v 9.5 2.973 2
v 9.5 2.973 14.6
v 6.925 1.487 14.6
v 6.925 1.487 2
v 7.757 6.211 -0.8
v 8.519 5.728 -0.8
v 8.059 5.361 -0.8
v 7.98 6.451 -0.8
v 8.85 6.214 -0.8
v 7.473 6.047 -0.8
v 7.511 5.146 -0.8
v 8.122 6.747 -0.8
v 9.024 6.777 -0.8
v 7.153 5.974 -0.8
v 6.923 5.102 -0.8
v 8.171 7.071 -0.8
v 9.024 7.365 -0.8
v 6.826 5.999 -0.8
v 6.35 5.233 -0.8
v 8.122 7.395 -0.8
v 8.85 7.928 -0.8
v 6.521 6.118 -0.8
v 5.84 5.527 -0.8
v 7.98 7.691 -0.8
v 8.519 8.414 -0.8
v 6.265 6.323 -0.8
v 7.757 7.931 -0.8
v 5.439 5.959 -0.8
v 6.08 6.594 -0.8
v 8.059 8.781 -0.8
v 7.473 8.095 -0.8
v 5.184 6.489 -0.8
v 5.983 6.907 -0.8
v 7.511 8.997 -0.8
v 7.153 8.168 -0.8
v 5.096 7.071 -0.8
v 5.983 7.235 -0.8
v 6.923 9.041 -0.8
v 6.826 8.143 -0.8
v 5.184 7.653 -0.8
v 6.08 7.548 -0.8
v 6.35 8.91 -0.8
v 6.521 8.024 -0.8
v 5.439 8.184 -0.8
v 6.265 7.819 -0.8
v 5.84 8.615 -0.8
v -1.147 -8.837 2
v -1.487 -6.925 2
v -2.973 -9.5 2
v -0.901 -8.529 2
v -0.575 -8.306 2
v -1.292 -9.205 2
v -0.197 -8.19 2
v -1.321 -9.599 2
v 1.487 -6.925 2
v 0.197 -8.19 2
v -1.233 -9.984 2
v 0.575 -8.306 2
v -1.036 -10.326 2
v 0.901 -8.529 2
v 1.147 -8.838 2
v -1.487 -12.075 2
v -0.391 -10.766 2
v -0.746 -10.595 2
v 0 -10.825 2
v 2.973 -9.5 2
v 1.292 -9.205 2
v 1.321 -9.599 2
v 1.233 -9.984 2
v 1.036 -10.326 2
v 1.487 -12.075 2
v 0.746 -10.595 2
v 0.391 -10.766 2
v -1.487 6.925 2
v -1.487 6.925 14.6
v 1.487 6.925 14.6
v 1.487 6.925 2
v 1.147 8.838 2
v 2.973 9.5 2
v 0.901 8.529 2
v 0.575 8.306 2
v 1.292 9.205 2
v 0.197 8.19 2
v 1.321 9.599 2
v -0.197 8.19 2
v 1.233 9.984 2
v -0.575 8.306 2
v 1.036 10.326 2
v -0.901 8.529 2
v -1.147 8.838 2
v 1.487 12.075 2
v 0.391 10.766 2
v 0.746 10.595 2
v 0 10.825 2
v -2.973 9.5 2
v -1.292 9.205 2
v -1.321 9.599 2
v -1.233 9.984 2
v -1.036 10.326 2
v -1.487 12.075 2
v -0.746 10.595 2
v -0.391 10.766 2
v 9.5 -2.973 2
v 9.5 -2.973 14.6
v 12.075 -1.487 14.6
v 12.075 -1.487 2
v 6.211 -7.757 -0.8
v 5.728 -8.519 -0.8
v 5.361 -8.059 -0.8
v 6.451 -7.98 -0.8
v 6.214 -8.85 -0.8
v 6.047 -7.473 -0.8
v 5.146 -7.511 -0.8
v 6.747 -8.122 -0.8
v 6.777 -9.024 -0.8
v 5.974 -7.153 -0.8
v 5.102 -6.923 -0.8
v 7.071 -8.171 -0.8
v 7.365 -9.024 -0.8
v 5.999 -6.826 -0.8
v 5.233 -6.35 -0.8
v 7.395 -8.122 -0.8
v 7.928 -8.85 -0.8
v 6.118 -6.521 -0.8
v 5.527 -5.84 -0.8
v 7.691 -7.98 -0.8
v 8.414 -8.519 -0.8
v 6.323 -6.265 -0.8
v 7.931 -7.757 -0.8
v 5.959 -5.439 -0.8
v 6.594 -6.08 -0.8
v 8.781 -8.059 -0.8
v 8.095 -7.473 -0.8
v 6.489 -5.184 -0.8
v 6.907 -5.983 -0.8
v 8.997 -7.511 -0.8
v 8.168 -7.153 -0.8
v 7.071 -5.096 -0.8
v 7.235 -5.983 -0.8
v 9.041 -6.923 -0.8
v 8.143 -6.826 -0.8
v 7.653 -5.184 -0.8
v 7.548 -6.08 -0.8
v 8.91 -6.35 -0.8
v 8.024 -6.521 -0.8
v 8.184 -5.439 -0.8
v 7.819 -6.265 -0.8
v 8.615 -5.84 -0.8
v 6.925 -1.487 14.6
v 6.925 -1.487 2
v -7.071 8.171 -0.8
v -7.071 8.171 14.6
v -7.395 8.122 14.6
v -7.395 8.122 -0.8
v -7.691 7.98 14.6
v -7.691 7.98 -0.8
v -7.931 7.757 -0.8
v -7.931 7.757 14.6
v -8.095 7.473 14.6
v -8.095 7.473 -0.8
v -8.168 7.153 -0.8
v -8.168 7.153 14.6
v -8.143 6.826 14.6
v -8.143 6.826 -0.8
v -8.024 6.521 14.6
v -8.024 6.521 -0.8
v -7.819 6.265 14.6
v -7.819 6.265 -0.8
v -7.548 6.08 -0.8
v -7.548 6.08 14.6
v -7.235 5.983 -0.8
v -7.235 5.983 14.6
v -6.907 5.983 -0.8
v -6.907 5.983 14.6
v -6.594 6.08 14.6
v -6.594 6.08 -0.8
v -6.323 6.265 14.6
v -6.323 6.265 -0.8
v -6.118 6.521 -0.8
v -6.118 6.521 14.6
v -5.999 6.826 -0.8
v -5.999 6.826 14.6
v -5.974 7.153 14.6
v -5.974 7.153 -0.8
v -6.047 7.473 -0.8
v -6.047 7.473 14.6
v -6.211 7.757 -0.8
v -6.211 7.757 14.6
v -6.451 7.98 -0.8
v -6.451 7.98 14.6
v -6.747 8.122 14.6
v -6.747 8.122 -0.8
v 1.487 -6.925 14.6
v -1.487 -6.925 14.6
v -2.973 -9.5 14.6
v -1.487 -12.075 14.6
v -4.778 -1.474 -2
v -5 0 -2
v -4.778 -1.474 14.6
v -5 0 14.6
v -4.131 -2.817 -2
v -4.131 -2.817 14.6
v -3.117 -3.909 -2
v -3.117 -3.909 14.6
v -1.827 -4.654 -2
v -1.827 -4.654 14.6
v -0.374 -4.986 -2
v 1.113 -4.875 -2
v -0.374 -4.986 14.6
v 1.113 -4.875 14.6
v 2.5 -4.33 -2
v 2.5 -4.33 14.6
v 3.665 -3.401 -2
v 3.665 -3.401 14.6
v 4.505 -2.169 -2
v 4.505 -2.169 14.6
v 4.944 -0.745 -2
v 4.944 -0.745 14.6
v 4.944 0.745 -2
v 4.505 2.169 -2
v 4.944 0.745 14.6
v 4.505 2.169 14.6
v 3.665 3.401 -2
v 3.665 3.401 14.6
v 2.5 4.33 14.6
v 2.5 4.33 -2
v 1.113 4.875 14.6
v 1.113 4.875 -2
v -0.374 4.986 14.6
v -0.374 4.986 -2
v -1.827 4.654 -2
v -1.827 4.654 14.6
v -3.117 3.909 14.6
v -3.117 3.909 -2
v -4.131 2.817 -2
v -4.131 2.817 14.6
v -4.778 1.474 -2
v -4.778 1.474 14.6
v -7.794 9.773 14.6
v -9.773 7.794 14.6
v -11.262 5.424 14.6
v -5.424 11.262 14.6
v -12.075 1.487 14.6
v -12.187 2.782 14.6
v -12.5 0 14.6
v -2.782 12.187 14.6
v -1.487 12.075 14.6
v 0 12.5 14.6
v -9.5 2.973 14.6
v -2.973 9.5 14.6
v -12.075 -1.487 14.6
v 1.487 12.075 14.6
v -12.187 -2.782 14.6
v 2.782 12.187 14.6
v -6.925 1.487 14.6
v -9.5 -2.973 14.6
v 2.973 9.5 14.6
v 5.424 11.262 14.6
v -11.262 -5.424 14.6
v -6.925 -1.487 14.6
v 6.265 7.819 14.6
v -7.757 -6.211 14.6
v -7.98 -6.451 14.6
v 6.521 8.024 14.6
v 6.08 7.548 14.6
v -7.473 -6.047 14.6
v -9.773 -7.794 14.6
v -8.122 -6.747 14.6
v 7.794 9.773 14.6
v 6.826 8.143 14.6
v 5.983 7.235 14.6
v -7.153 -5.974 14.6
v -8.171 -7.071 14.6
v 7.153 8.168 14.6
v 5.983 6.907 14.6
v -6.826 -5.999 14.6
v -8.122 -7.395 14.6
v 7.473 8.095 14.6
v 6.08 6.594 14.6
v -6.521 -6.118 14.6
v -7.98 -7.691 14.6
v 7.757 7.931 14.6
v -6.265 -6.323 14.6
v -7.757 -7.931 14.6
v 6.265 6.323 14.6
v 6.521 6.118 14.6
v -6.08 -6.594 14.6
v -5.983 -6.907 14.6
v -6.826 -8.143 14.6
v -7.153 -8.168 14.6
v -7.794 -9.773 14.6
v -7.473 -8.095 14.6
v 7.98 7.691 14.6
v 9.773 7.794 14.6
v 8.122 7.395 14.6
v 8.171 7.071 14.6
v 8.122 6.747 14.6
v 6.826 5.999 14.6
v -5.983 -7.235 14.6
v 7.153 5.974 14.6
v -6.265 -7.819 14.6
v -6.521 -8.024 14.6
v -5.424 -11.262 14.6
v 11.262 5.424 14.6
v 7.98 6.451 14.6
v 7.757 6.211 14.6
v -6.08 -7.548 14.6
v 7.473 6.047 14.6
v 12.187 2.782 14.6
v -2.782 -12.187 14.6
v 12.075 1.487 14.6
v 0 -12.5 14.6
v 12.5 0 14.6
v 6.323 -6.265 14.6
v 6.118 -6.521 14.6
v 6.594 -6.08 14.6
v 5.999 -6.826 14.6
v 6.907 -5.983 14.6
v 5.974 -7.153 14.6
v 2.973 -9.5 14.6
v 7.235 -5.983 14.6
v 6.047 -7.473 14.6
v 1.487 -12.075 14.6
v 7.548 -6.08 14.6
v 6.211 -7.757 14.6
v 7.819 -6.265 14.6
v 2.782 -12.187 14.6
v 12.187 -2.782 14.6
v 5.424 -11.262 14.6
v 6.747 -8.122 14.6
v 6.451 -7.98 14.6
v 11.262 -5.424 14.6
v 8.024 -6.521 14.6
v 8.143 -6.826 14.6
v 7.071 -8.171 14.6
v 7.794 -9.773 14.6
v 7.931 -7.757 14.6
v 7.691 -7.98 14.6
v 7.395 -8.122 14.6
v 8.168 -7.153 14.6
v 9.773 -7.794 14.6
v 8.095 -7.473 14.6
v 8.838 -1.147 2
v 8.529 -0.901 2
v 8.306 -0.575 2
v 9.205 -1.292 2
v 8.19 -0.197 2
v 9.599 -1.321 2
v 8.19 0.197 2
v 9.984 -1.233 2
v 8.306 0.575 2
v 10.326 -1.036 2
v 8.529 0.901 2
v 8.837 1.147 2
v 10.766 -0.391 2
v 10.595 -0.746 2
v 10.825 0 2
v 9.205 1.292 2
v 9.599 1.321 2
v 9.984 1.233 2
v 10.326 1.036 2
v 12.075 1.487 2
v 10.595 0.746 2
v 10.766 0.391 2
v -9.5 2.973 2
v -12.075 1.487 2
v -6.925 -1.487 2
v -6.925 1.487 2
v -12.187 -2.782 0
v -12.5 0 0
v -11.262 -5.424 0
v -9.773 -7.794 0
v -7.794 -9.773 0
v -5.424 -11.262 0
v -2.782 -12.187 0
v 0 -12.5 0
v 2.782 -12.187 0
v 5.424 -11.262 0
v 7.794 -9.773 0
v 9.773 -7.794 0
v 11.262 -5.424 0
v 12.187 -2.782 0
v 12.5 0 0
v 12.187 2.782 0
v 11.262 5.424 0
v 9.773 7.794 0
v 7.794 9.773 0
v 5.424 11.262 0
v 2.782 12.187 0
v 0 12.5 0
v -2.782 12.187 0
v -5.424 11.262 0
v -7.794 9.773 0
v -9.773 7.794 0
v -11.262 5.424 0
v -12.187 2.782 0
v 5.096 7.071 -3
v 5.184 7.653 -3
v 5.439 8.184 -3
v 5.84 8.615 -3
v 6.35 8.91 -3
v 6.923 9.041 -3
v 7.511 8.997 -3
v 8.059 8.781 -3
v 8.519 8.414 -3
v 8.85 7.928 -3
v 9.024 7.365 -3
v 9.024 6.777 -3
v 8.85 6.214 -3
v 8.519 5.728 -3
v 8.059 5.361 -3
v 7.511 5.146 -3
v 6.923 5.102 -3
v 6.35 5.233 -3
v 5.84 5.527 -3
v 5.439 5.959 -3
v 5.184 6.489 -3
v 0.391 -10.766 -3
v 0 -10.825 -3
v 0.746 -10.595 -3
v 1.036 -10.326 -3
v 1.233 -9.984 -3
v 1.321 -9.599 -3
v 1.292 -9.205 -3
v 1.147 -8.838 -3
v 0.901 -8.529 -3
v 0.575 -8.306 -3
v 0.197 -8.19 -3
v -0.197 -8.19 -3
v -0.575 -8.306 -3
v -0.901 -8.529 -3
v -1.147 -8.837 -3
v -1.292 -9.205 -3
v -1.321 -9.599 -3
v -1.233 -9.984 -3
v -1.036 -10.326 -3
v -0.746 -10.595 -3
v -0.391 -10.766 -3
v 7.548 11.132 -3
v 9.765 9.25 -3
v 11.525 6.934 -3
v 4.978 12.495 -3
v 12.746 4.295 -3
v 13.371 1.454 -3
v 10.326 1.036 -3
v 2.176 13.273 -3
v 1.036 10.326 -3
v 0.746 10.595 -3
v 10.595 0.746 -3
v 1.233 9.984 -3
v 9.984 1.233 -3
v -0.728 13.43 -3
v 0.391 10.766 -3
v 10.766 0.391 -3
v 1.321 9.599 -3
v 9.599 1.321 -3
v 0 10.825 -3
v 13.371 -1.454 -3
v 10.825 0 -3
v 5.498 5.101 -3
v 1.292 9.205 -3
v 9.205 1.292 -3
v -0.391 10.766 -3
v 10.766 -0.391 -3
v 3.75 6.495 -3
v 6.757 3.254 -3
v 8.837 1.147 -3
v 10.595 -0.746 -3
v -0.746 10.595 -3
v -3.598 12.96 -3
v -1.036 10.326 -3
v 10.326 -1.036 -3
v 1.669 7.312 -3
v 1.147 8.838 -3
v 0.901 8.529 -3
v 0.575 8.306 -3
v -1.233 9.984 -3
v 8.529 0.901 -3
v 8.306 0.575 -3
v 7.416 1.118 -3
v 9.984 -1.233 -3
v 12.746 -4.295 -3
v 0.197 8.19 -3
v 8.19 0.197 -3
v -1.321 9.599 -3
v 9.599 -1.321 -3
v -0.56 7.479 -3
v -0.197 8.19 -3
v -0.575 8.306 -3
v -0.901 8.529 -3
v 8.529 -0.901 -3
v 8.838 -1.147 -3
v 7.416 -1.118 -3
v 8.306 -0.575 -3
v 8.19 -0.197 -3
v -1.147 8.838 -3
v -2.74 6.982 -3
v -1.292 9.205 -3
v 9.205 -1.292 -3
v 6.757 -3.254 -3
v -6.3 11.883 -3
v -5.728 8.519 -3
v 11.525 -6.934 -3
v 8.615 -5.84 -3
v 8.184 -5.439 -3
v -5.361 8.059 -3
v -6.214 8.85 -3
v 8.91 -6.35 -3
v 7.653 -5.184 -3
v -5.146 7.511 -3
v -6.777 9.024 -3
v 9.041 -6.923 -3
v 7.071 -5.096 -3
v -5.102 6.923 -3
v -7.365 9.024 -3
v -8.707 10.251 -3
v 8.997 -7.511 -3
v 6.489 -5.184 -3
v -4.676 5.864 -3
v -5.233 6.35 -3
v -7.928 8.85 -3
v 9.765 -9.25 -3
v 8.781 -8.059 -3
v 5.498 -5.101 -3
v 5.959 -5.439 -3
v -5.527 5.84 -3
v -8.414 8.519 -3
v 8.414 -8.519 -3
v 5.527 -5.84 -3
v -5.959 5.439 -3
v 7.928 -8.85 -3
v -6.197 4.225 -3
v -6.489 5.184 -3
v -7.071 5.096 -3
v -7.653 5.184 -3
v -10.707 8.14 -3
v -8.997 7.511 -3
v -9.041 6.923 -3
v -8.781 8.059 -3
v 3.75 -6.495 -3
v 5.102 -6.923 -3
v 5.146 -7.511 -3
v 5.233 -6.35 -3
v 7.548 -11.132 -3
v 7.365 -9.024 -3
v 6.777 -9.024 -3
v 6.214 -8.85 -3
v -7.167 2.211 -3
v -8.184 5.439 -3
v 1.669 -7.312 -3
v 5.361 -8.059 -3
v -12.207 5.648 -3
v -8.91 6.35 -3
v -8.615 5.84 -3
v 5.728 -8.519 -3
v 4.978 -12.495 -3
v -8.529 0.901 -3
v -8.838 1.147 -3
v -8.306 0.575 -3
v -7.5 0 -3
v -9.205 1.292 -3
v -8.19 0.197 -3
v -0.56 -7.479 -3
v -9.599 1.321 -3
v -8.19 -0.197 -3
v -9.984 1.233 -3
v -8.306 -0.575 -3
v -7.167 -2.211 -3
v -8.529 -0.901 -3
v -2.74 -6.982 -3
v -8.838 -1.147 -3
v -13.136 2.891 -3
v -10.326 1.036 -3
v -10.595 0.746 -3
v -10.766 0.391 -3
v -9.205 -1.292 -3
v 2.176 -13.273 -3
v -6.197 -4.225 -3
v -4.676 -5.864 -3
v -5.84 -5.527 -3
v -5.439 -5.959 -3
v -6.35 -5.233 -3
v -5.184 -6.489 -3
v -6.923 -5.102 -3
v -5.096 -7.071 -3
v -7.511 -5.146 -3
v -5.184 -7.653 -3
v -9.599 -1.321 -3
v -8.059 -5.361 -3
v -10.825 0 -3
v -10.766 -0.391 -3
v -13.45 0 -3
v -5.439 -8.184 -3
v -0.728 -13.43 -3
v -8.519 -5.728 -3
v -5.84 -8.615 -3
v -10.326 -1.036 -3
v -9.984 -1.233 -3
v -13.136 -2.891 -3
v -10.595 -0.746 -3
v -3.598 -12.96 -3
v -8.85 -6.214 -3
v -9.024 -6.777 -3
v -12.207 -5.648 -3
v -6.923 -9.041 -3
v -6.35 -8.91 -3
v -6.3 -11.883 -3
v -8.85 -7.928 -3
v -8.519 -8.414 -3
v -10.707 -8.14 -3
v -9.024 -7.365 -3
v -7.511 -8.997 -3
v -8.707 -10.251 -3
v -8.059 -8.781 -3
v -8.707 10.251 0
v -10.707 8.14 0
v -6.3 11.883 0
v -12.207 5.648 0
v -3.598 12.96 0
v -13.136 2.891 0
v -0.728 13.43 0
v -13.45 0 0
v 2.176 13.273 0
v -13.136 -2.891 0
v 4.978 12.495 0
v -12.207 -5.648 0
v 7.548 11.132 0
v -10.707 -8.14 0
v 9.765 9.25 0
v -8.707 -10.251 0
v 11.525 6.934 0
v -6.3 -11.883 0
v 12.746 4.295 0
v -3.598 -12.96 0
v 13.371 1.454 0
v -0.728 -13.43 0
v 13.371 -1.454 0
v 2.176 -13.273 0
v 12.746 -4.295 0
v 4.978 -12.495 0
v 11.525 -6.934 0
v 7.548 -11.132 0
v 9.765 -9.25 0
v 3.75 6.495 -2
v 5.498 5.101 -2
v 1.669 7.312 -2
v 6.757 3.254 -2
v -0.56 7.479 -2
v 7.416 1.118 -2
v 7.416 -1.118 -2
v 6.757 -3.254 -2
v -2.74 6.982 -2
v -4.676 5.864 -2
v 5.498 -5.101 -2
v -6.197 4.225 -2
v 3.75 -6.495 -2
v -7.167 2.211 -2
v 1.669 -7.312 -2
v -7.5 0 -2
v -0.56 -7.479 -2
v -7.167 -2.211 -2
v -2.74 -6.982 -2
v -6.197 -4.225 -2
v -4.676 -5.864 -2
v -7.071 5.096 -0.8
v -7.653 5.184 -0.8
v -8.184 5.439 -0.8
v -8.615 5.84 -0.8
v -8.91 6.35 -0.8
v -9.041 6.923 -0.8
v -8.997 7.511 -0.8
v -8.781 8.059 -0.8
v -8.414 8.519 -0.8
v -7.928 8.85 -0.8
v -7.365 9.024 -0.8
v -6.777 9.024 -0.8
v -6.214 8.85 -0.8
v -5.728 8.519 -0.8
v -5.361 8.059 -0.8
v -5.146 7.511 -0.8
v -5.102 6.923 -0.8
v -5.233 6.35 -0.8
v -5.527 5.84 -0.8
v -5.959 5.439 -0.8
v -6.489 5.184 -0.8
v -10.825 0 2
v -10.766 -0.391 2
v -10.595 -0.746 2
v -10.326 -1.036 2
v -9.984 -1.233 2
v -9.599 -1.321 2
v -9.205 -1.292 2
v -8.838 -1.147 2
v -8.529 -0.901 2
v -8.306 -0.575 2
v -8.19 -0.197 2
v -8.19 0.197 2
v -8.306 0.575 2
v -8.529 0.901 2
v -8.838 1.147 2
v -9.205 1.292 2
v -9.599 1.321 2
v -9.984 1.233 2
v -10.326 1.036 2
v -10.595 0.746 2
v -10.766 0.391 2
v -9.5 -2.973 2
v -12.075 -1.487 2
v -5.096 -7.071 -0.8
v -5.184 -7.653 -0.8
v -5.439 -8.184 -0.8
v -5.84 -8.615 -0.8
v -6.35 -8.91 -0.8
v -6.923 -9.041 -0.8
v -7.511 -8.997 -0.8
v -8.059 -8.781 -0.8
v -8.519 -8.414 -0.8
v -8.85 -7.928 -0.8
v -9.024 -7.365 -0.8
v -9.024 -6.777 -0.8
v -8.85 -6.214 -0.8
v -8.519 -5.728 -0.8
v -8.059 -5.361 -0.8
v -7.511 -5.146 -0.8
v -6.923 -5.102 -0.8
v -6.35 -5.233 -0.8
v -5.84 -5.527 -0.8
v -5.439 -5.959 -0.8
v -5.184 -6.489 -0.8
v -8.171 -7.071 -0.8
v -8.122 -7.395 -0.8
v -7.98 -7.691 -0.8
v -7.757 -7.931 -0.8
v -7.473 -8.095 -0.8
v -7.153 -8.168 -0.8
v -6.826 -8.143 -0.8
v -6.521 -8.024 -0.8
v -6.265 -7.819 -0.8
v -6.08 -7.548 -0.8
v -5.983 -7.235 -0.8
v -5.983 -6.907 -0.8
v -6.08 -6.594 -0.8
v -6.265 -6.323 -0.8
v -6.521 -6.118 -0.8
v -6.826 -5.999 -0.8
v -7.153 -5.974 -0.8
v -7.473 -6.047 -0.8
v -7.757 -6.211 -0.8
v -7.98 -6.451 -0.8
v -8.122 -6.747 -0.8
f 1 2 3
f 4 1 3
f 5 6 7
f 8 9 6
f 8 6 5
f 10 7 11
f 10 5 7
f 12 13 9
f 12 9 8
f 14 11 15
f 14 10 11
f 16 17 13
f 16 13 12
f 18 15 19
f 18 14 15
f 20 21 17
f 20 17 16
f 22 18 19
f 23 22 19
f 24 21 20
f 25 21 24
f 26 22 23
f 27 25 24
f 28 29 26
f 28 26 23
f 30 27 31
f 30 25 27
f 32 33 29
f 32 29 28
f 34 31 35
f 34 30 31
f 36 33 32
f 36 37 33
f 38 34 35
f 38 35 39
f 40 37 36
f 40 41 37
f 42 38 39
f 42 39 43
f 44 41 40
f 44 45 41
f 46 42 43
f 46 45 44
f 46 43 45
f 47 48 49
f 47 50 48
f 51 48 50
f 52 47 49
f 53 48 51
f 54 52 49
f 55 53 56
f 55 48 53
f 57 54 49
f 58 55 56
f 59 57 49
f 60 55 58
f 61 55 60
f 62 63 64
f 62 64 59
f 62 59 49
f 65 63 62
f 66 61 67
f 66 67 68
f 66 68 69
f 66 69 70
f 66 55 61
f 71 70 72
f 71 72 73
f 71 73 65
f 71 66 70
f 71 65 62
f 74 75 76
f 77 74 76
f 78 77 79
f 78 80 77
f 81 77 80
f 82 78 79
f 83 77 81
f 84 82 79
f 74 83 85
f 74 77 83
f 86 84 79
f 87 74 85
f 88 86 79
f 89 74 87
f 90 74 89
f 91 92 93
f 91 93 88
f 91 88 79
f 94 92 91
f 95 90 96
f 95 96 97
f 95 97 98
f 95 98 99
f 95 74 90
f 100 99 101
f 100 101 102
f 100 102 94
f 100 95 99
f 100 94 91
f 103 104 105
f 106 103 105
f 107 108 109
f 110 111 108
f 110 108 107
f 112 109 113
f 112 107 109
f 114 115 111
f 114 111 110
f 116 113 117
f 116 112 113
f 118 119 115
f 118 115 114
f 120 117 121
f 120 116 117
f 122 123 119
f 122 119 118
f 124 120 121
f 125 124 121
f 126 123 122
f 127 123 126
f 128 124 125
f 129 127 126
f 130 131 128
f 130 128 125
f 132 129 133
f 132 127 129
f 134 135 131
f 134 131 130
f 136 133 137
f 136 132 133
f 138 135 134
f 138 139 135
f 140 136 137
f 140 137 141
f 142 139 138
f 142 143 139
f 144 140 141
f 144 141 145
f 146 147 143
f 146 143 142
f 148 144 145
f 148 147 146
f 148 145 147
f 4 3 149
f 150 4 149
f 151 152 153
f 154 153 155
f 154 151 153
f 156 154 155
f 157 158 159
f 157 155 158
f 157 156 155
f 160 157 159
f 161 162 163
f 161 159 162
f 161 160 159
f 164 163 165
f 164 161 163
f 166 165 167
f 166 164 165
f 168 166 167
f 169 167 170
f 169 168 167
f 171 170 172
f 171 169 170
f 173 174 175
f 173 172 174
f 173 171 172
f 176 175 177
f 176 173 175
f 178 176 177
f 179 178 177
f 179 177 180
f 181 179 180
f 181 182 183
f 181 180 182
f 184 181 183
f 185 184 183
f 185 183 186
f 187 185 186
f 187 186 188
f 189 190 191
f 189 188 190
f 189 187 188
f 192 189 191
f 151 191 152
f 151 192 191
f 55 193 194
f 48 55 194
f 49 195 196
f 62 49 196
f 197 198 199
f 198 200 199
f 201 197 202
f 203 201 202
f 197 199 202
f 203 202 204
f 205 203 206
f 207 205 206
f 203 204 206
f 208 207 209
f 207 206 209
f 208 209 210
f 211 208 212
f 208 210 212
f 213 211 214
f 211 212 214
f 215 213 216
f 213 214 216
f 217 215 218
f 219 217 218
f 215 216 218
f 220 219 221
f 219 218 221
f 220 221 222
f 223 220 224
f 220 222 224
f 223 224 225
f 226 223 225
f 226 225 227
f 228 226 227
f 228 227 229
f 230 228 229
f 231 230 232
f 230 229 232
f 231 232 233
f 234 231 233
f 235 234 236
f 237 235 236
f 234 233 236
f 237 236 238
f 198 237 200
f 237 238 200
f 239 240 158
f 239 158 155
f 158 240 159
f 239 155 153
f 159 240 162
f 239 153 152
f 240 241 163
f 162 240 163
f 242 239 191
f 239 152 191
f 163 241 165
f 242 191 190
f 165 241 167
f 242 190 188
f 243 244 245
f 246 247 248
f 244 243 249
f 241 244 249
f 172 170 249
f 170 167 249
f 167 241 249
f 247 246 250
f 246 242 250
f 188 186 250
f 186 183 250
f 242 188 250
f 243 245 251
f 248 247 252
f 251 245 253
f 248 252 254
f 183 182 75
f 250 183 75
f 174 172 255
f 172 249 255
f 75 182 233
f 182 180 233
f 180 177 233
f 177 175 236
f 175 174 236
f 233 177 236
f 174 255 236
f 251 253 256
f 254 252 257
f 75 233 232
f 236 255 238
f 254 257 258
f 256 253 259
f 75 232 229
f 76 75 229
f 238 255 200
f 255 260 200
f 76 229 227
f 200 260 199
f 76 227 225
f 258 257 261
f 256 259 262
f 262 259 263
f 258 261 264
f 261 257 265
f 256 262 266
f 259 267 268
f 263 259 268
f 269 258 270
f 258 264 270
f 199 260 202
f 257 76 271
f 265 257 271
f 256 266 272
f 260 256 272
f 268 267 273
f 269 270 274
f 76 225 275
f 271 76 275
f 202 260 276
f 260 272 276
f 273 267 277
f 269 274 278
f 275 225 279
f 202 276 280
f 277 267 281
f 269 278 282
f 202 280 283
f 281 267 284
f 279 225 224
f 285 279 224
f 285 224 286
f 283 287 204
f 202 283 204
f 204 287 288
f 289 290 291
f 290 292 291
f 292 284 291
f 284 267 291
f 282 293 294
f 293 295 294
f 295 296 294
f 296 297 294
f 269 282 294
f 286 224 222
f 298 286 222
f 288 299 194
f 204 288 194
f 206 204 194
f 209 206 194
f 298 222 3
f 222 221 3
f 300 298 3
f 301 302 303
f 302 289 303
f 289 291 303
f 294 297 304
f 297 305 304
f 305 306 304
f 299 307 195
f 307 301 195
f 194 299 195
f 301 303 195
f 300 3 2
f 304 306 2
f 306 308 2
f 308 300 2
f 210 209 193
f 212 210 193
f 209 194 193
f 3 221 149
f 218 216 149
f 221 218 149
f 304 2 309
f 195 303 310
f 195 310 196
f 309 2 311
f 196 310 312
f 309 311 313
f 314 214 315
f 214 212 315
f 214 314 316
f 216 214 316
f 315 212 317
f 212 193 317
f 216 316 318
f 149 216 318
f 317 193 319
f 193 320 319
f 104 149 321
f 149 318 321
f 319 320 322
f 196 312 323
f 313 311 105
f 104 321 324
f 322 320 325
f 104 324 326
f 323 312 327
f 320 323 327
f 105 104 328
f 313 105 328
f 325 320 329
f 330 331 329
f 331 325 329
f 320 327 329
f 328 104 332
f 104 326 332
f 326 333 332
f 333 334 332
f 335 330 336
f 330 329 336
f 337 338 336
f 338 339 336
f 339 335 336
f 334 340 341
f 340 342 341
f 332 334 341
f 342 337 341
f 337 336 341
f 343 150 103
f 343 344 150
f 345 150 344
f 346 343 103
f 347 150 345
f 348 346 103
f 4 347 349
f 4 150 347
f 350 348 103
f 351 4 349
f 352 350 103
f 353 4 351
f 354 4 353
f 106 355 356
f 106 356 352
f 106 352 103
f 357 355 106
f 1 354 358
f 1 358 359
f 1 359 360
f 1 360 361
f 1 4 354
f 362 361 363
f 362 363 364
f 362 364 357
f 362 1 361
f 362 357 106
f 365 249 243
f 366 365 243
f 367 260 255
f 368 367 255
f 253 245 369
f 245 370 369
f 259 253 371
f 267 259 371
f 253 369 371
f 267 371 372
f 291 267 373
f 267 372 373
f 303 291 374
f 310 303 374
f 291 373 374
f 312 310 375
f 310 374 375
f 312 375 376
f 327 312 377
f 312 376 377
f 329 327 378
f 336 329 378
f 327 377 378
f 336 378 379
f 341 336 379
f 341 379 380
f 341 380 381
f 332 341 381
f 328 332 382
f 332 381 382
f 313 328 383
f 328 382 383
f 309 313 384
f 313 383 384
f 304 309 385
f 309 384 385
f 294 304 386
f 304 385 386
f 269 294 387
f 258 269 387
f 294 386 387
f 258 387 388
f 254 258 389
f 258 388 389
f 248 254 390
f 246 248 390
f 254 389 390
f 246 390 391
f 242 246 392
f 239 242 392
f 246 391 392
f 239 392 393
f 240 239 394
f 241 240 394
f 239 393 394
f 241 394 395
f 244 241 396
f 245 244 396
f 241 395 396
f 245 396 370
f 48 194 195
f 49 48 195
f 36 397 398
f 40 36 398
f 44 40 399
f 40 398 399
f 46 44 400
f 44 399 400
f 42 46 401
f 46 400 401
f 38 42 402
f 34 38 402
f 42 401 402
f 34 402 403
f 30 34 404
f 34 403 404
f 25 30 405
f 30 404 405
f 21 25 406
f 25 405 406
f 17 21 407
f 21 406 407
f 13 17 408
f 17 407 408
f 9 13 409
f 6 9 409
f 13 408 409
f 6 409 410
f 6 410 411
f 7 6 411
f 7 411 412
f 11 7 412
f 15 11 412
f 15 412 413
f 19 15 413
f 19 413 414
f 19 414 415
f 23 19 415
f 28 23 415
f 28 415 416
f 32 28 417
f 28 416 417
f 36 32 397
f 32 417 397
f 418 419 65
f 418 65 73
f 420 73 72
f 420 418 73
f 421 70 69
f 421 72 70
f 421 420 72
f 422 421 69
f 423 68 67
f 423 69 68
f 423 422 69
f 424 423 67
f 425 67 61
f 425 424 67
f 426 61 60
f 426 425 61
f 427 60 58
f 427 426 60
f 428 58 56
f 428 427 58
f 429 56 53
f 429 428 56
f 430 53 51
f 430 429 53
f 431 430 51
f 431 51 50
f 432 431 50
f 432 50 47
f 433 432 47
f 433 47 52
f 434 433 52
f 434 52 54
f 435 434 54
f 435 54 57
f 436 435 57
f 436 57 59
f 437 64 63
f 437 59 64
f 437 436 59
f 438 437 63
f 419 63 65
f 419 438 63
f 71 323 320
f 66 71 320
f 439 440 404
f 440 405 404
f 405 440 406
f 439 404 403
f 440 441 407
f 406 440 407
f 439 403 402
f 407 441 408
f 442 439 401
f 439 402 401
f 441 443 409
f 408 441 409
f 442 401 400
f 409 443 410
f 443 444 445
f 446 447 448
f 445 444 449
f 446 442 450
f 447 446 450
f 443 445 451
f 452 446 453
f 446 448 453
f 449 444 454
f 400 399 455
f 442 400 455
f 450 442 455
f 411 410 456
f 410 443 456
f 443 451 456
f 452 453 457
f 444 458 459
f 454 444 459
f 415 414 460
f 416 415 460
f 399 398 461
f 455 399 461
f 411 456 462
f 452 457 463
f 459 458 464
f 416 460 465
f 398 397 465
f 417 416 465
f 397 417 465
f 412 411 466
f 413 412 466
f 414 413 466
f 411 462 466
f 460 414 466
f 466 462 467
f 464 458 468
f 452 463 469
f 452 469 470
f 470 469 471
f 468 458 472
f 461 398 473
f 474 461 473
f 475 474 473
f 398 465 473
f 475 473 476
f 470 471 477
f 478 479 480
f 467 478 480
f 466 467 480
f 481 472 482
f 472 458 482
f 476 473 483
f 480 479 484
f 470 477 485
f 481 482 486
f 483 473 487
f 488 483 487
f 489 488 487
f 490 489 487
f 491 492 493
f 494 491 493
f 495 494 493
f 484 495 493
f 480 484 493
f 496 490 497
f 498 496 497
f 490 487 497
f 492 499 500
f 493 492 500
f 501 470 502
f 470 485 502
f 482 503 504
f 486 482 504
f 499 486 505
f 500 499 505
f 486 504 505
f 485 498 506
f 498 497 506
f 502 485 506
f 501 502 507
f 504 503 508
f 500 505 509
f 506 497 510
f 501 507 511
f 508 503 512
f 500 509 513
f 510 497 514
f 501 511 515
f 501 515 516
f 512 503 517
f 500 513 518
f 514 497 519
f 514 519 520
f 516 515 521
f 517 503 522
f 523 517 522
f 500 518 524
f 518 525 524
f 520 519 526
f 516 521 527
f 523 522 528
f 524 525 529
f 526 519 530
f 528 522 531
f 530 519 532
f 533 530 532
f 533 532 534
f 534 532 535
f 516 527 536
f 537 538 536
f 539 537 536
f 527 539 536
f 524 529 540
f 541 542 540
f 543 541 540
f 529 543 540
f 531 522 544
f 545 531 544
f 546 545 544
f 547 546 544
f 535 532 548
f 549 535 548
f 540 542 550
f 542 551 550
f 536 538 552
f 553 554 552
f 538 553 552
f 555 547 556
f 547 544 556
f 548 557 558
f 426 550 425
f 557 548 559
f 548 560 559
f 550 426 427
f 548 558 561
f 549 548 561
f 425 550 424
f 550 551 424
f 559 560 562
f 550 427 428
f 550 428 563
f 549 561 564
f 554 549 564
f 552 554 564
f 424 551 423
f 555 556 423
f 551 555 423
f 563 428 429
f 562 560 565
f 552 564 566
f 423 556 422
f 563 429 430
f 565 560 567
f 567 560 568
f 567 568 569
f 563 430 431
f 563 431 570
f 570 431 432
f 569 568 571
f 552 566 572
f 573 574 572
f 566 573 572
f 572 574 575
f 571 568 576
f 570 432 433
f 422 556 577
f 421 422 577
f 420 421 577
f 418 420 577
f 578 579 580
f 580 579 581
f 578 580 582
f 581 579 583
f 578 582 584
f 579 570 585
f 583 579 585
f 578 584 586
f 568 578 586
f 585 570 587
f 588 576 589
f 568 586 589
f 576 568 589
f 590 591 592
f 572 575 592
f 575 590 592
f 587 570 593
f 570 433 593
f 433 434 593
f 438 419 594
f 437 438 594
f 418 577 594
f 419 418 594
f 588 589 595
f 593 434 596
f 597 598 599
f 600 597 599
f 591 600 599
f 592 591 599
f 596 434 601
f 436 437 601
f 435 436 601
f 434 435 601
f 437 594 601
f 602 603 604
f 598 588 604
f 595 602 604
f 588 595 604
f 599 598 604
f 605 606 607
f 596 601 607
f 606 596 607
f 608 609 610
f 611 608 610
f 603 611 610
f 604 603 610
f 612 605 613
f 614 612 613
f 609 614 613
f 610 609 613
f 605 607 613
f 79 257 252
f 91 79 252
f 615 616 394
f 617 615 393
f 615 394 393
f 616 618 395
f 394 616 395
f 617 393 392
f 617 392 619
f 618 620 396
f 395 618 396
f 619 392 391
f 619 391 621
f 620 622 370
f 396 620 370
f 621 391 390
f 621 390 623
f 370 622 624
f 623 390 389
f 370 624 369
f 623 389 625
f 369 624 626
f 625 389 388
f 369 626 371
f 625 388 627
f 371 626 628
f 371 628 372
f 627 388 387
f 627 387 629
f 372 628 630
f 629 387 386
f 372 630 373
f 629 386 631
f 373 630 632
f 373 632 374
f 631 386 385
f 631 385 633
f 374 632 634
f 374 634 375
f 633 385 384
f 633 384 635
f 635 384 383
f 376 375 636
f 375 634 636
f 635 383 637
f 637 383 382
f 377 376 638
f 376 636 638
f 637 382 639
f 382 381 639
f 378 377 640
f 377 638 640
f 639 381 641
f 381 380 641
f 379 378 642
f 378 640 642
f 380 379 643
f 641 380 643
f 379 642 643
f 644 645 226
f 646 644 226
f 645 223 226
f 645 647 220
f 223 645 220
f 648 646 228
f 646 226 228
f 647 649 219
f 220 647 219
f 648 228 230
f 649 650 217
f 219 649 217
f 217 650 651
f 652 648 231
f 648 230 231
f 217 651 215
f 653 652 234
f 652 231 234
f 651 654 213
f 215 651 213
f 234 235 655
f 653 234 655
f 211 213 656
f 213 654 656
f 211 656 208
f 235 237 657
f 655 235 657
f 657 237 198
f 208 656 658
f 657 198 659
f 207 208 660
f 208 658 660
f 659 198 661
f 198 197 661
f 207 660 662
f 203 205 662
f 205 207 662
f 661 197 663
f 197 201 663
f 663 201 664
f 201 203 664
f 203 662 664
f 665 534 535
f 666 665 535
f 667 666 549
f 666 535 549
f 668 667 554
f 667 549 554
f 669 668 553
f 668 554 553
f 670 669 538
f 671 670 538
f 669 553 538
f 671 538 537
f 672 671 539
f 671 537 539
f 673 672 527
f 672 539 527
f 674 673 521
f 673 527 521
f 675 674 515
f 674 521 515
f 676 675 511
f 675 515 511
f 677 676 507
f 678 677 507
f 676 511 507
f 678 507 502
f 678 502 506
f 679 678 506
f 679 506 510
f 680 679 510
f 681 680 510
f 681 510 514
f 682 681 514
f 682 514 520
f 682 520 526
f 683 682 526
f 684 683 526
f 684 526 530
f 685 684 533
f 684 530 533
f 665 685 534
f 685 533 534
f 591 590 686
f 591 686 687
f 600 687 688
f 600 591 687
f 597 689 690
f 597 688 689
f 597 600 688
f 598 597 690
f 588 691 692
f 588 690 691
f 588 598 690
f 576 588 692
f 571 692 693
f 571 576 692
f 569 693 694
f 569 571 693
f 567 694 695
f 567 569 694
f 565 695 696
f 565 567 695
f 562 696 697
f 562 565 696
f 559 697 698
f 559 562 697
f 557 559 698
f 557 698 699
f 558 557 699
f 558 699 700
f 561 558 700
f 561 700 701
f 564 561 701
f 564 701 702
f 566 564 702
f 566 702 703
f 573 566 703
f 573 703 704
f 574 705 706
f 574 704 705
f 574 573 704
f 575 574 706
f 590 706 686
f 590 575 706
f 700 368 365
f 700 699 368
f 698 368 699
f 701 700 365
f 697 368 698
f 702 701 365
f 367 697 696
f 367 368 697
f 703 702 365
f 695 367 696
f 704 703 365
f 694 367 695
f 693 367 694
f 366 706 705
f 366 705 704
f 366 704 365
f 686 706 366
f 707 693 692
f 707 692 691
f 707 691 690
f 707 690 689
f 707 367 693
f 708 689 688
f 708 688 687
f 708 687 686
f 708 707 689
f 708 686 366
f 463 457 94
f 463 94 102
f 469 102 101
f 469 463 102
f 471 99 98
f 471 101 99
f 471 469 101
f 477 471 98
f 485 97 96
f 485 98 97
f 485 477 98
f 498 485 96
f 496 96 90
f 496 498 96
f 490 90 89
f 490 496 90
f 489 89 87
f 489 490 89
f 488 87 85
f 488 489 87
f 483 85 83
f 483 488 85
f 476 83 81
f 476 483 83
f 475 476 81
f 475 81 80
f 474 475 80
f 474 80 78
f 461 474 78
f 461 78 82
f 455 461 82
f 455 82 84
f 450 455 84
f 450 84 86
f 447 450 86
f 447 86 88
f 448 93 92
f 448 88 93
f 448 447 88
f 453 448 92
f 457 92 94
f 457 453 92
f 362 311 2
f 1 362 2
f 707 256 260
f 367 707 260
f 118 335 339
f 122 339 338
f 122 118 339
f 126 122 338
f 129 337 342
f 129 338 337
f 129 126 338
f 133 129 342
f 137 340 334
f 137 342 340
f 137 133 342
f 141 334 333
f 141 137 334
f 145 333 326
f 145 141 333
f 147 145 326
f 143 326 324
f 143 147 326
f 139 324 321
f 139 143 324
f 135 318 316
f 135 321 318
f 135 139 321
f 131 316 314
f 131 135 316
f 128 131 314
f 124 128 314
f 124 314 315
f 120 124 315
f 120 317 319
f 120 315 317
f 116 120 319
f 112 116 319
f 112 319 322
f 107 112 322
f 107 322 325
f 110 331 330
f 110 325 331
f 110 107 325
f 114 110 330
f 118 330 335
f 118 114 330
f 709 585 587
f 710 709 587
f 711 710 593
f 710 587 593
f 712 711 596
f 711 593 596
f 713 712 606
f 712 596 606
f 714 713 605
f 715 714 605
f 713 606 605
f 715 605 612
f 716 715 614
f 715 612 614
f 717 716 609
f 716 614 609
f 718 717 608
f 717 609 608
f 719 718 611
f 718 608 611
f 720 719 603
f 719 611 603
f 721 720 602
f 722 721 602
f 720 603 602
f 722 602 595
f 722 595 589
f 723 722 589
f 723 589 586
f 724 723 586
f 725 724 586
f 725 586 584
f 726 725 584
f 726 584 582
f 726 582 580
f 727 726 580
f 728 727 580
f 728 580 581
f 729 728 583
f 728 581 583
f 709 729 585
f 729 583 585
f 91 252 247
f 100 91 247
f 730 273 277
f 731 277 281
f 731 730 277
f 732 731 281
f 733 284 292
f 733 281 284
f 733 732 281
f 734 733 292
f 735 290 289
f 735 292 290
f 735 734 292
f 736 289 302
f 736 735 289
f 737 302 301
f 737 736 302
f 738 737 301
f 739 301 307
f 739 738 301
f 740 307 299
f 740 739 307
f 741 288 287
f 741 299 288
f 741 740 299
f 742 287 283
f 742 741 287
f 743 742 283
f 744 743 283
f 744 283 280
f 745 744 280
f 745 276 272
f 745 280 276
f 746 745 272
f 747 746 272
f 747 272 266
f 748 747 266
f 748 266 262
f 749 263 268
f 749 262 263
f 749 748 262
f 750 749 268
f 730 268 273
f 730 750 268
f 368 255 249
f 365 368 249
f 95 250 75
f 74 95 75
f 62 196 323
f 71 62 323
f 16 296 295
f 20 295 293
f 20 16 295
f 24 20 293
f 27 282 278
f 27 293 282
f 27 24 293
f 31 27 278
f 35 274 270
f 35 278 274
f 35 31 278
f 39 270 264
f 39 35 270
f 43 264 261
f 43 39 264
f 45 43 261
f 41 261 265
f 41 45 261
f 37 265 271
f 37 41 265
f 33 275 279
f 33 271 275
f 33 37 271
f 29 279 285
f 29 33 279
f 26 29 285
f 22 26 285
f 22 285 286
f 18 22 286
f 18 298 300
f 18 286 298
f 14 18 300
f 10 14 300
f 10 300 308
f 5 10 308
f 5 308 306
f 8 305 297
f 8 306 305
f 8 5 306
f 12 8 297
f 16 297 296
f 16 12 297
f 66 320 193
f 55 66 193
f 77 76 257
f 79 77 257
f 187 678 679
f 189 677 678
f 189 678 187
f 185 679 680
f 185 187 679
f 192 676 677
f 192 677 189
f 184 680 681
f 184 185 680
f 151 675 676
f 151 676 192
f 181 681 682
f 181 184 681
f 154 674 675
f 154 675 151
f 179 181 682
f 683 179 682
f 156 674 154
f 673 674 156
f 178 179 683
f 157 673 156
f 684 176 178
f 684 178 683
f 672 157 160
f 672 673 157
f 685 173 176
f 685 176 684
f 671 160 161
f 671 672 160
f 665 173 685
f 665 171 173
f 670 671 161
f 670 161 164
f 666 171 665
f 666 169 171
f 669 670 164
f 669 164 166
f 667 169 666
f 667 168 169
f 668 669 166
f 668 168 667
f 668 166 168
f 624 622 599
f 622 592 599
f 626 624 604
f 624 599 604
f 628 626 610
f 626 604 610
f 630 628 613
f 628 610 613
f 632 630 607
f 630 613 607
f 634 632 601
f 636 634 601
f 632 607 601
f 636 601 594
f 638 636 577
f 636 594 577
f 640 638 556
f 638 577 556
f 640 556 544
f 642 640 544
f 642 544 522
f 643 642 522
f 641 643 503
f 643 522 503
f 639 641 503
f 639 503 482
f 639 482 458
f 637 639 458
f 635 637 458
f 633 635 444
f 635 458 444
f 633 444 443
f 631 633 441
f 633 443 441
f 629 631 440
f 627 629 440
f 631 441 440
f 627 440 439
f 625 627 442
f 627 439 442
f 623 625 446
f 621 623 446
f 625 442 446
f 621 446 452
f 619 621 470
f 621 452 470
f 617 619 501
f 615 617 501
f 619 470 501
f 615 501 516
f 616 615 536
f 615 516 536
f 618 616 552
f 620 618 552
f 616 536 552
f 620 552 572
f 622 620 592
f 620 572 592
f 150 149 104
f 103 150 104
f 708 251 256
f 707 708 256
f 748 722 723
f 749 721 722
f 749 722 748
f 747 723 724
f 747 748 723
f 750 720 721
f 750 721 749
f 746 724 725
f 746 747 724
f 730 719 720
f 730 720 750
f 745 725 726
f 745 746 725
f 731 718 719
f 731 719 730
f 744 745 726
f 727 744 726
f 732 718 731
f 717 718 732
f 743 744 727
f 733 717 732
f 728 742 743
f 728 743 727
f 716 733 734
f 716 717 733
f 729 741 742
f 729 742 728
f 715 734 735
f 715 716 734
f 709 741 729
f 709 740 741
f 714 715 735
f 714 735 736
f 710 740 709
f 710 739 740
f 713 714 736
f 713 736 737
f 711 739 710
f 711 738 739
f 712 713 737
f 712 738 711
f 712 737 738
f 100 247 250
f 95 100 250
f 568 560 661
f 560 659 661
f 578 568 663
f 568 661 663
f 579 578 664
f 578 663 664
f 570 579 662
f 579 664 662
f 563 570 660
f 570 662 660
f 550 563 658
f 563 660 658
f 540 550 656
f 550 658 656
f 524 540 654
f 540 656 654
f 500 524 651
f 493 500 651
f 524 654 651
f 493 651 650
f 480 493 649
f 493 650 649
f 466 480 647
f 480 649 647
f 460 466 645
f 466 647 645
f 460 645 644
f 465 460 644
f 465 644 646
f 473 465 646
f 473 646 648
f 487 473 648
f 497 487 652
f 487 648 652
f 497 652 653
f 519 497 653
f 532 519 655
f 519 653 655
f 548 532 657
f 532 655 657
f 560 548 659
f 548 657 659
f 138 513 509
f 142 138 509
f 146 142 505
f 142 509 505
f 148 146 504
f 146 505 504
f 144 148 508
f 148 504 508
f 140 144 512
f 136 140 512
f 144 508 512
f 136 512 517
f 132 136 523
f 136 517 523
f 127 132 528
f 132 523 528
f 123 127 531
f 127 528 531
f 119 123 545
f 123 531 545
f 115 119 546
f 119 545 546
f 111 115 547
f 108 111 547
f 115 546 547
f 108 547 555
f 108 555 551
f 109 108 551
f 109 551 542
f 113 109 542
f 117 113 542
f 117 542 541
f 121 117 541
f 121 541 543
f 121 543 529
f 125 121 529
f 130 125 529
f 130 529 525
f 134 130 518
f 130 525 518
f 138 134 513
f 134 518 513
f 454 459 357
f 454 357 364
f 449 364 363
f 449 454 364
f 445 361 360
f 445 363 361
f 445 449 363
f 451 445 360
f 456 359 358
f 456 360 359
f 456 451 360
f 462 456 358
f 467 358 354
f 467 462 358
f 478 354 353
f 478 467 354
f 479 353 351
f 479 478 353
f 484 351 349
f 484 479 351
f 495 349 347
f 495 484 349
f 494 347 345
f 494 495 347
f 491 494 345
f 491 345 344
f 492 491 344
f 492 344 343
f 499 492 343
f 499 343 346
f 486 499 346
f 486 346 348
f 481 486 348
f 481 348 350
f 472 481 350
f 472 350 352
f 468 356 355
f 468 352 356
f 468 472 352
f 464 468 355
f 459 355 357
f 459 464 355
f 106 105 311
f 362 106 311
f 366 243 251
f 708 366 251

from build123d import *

# Parameters (mm, degrees)
ATTACHMENTBOLTHOLES_START = -4
SKETCH11_R                = 1.325
ATTACHMENTBOLTHOLES_DEPTH = 19.6
SKETCH13_R                = 1.975
SHAFTBOLTHEAD_DEPTH       = 2.2
SHAFTBOLTTHRU_START       = -4
SKETCH14_R                = 1.1
SHAFTBOLTTHRU_DEPTH       = 19.6
NUTHOLE_DEPTH             = 12.6
CIRPATTERN1_COUNT         = 4


with BuildPart() as part:
    # Sketch10 → Revolve1 (revolve)
    with BuildSketch(Plane(origin=(0, 0, 0), x_dir=(1, 0, 0), z_dir=(0, 1, 0))):
        Polygon((-13.45, 3), (-7.5, 3), (-7.5, 2), (-5, 2), (-5, -14.6), (-12.5, -14.6), (-12.5, 0), (-13.45, 0), align=None)
    revolve(axis=Axis((0, 0, -38.468953364), (0, 0, 1)))

    # Sketch11 → AttachmentBoltHoles (cut)
    with BuildSketch(Plane.XY.offset(ATTACHMENTBOLTHOLES_START)):
        with Locations((9.5, 0)):
            Circle(SKETCH11_R)
    attachmentboltholes = extrude(amount=ATTACHMENTBOLTHOLES_DEPTH, mode=Mode.SUBTRACT)

    # Sketch13 → ShaftBoltHead (cut)
    with BuildSketch(Plane(origin=(0, 0, -3), x_dir=(-1, 0, 0), z_dir=(0, 0, -1))):
        with Locations((-7.071067812, 7.071067812)):
            Circle(SKETCH13_R)
    shaftbolthead = extrude(amount=-SHAFTBOLTHEAD_DEPTH, mode=Mode.SUBTRACT)

    # Sketch14 → ShaftBoltThru (cut)
    with BuildSketch(Plane.XY.offset(SHAFTBOLTTHRU_START)):
        with Locations((7.071067812, 7.071067812)):
            Circle(SKETCH14_R)
    shaftboltthru = extrude(amount=SHAFTBOLTTHRU_DEPTH, mode=Mode.SUBTRACT)

    # Sketch12 → NutHole (cut)
    with BuildSketch(Plane.XY.offset(14.6)):
        Polygon((12.075, -1.486676943), (12.075, 1.486676943), (9.5, 2.973353886), (6.925, 1.486676943), (6.925, -1.486676943), (9.5, -2.973353886), align=None)
    nuthole = extrude(amount=-NUTHOLE_DEPTH, mode=Mode.SUBTRACT)

    # CirPattern1: AttachmentBoltHoles, ShaftBoltHead, ShaftBoltThru, NutHole ×4 about axis
    cirpattern1_axis = Axis((0, 0, 0), (0, 0, 1))
    for i in range(1, CIRPATTERN1_COUNT):
        add(attachmentboltholes.rotate(cirpattern1_axis, i * 360 / CIRPATTERN1_COUNT), mode=Mode.SUBTRACT)
        add(shaftbolthead.rotate(cirpattern1_axis, i * 360 / CIRPATTERN1_COUNT), mode=Mode.SUBTRACT)
        add(shaftboltthru.rotate(cirpattern1_axis, i * 360 / CIRPATTERN1_COUNT), mode=Mode.SUBTRACT)
        add(nuthole.rotate(cirpattern1_axis, i * 360 / CIRPATTERN1_COUNT), mode=Mode.SUBTRACT)


solid = part.part
